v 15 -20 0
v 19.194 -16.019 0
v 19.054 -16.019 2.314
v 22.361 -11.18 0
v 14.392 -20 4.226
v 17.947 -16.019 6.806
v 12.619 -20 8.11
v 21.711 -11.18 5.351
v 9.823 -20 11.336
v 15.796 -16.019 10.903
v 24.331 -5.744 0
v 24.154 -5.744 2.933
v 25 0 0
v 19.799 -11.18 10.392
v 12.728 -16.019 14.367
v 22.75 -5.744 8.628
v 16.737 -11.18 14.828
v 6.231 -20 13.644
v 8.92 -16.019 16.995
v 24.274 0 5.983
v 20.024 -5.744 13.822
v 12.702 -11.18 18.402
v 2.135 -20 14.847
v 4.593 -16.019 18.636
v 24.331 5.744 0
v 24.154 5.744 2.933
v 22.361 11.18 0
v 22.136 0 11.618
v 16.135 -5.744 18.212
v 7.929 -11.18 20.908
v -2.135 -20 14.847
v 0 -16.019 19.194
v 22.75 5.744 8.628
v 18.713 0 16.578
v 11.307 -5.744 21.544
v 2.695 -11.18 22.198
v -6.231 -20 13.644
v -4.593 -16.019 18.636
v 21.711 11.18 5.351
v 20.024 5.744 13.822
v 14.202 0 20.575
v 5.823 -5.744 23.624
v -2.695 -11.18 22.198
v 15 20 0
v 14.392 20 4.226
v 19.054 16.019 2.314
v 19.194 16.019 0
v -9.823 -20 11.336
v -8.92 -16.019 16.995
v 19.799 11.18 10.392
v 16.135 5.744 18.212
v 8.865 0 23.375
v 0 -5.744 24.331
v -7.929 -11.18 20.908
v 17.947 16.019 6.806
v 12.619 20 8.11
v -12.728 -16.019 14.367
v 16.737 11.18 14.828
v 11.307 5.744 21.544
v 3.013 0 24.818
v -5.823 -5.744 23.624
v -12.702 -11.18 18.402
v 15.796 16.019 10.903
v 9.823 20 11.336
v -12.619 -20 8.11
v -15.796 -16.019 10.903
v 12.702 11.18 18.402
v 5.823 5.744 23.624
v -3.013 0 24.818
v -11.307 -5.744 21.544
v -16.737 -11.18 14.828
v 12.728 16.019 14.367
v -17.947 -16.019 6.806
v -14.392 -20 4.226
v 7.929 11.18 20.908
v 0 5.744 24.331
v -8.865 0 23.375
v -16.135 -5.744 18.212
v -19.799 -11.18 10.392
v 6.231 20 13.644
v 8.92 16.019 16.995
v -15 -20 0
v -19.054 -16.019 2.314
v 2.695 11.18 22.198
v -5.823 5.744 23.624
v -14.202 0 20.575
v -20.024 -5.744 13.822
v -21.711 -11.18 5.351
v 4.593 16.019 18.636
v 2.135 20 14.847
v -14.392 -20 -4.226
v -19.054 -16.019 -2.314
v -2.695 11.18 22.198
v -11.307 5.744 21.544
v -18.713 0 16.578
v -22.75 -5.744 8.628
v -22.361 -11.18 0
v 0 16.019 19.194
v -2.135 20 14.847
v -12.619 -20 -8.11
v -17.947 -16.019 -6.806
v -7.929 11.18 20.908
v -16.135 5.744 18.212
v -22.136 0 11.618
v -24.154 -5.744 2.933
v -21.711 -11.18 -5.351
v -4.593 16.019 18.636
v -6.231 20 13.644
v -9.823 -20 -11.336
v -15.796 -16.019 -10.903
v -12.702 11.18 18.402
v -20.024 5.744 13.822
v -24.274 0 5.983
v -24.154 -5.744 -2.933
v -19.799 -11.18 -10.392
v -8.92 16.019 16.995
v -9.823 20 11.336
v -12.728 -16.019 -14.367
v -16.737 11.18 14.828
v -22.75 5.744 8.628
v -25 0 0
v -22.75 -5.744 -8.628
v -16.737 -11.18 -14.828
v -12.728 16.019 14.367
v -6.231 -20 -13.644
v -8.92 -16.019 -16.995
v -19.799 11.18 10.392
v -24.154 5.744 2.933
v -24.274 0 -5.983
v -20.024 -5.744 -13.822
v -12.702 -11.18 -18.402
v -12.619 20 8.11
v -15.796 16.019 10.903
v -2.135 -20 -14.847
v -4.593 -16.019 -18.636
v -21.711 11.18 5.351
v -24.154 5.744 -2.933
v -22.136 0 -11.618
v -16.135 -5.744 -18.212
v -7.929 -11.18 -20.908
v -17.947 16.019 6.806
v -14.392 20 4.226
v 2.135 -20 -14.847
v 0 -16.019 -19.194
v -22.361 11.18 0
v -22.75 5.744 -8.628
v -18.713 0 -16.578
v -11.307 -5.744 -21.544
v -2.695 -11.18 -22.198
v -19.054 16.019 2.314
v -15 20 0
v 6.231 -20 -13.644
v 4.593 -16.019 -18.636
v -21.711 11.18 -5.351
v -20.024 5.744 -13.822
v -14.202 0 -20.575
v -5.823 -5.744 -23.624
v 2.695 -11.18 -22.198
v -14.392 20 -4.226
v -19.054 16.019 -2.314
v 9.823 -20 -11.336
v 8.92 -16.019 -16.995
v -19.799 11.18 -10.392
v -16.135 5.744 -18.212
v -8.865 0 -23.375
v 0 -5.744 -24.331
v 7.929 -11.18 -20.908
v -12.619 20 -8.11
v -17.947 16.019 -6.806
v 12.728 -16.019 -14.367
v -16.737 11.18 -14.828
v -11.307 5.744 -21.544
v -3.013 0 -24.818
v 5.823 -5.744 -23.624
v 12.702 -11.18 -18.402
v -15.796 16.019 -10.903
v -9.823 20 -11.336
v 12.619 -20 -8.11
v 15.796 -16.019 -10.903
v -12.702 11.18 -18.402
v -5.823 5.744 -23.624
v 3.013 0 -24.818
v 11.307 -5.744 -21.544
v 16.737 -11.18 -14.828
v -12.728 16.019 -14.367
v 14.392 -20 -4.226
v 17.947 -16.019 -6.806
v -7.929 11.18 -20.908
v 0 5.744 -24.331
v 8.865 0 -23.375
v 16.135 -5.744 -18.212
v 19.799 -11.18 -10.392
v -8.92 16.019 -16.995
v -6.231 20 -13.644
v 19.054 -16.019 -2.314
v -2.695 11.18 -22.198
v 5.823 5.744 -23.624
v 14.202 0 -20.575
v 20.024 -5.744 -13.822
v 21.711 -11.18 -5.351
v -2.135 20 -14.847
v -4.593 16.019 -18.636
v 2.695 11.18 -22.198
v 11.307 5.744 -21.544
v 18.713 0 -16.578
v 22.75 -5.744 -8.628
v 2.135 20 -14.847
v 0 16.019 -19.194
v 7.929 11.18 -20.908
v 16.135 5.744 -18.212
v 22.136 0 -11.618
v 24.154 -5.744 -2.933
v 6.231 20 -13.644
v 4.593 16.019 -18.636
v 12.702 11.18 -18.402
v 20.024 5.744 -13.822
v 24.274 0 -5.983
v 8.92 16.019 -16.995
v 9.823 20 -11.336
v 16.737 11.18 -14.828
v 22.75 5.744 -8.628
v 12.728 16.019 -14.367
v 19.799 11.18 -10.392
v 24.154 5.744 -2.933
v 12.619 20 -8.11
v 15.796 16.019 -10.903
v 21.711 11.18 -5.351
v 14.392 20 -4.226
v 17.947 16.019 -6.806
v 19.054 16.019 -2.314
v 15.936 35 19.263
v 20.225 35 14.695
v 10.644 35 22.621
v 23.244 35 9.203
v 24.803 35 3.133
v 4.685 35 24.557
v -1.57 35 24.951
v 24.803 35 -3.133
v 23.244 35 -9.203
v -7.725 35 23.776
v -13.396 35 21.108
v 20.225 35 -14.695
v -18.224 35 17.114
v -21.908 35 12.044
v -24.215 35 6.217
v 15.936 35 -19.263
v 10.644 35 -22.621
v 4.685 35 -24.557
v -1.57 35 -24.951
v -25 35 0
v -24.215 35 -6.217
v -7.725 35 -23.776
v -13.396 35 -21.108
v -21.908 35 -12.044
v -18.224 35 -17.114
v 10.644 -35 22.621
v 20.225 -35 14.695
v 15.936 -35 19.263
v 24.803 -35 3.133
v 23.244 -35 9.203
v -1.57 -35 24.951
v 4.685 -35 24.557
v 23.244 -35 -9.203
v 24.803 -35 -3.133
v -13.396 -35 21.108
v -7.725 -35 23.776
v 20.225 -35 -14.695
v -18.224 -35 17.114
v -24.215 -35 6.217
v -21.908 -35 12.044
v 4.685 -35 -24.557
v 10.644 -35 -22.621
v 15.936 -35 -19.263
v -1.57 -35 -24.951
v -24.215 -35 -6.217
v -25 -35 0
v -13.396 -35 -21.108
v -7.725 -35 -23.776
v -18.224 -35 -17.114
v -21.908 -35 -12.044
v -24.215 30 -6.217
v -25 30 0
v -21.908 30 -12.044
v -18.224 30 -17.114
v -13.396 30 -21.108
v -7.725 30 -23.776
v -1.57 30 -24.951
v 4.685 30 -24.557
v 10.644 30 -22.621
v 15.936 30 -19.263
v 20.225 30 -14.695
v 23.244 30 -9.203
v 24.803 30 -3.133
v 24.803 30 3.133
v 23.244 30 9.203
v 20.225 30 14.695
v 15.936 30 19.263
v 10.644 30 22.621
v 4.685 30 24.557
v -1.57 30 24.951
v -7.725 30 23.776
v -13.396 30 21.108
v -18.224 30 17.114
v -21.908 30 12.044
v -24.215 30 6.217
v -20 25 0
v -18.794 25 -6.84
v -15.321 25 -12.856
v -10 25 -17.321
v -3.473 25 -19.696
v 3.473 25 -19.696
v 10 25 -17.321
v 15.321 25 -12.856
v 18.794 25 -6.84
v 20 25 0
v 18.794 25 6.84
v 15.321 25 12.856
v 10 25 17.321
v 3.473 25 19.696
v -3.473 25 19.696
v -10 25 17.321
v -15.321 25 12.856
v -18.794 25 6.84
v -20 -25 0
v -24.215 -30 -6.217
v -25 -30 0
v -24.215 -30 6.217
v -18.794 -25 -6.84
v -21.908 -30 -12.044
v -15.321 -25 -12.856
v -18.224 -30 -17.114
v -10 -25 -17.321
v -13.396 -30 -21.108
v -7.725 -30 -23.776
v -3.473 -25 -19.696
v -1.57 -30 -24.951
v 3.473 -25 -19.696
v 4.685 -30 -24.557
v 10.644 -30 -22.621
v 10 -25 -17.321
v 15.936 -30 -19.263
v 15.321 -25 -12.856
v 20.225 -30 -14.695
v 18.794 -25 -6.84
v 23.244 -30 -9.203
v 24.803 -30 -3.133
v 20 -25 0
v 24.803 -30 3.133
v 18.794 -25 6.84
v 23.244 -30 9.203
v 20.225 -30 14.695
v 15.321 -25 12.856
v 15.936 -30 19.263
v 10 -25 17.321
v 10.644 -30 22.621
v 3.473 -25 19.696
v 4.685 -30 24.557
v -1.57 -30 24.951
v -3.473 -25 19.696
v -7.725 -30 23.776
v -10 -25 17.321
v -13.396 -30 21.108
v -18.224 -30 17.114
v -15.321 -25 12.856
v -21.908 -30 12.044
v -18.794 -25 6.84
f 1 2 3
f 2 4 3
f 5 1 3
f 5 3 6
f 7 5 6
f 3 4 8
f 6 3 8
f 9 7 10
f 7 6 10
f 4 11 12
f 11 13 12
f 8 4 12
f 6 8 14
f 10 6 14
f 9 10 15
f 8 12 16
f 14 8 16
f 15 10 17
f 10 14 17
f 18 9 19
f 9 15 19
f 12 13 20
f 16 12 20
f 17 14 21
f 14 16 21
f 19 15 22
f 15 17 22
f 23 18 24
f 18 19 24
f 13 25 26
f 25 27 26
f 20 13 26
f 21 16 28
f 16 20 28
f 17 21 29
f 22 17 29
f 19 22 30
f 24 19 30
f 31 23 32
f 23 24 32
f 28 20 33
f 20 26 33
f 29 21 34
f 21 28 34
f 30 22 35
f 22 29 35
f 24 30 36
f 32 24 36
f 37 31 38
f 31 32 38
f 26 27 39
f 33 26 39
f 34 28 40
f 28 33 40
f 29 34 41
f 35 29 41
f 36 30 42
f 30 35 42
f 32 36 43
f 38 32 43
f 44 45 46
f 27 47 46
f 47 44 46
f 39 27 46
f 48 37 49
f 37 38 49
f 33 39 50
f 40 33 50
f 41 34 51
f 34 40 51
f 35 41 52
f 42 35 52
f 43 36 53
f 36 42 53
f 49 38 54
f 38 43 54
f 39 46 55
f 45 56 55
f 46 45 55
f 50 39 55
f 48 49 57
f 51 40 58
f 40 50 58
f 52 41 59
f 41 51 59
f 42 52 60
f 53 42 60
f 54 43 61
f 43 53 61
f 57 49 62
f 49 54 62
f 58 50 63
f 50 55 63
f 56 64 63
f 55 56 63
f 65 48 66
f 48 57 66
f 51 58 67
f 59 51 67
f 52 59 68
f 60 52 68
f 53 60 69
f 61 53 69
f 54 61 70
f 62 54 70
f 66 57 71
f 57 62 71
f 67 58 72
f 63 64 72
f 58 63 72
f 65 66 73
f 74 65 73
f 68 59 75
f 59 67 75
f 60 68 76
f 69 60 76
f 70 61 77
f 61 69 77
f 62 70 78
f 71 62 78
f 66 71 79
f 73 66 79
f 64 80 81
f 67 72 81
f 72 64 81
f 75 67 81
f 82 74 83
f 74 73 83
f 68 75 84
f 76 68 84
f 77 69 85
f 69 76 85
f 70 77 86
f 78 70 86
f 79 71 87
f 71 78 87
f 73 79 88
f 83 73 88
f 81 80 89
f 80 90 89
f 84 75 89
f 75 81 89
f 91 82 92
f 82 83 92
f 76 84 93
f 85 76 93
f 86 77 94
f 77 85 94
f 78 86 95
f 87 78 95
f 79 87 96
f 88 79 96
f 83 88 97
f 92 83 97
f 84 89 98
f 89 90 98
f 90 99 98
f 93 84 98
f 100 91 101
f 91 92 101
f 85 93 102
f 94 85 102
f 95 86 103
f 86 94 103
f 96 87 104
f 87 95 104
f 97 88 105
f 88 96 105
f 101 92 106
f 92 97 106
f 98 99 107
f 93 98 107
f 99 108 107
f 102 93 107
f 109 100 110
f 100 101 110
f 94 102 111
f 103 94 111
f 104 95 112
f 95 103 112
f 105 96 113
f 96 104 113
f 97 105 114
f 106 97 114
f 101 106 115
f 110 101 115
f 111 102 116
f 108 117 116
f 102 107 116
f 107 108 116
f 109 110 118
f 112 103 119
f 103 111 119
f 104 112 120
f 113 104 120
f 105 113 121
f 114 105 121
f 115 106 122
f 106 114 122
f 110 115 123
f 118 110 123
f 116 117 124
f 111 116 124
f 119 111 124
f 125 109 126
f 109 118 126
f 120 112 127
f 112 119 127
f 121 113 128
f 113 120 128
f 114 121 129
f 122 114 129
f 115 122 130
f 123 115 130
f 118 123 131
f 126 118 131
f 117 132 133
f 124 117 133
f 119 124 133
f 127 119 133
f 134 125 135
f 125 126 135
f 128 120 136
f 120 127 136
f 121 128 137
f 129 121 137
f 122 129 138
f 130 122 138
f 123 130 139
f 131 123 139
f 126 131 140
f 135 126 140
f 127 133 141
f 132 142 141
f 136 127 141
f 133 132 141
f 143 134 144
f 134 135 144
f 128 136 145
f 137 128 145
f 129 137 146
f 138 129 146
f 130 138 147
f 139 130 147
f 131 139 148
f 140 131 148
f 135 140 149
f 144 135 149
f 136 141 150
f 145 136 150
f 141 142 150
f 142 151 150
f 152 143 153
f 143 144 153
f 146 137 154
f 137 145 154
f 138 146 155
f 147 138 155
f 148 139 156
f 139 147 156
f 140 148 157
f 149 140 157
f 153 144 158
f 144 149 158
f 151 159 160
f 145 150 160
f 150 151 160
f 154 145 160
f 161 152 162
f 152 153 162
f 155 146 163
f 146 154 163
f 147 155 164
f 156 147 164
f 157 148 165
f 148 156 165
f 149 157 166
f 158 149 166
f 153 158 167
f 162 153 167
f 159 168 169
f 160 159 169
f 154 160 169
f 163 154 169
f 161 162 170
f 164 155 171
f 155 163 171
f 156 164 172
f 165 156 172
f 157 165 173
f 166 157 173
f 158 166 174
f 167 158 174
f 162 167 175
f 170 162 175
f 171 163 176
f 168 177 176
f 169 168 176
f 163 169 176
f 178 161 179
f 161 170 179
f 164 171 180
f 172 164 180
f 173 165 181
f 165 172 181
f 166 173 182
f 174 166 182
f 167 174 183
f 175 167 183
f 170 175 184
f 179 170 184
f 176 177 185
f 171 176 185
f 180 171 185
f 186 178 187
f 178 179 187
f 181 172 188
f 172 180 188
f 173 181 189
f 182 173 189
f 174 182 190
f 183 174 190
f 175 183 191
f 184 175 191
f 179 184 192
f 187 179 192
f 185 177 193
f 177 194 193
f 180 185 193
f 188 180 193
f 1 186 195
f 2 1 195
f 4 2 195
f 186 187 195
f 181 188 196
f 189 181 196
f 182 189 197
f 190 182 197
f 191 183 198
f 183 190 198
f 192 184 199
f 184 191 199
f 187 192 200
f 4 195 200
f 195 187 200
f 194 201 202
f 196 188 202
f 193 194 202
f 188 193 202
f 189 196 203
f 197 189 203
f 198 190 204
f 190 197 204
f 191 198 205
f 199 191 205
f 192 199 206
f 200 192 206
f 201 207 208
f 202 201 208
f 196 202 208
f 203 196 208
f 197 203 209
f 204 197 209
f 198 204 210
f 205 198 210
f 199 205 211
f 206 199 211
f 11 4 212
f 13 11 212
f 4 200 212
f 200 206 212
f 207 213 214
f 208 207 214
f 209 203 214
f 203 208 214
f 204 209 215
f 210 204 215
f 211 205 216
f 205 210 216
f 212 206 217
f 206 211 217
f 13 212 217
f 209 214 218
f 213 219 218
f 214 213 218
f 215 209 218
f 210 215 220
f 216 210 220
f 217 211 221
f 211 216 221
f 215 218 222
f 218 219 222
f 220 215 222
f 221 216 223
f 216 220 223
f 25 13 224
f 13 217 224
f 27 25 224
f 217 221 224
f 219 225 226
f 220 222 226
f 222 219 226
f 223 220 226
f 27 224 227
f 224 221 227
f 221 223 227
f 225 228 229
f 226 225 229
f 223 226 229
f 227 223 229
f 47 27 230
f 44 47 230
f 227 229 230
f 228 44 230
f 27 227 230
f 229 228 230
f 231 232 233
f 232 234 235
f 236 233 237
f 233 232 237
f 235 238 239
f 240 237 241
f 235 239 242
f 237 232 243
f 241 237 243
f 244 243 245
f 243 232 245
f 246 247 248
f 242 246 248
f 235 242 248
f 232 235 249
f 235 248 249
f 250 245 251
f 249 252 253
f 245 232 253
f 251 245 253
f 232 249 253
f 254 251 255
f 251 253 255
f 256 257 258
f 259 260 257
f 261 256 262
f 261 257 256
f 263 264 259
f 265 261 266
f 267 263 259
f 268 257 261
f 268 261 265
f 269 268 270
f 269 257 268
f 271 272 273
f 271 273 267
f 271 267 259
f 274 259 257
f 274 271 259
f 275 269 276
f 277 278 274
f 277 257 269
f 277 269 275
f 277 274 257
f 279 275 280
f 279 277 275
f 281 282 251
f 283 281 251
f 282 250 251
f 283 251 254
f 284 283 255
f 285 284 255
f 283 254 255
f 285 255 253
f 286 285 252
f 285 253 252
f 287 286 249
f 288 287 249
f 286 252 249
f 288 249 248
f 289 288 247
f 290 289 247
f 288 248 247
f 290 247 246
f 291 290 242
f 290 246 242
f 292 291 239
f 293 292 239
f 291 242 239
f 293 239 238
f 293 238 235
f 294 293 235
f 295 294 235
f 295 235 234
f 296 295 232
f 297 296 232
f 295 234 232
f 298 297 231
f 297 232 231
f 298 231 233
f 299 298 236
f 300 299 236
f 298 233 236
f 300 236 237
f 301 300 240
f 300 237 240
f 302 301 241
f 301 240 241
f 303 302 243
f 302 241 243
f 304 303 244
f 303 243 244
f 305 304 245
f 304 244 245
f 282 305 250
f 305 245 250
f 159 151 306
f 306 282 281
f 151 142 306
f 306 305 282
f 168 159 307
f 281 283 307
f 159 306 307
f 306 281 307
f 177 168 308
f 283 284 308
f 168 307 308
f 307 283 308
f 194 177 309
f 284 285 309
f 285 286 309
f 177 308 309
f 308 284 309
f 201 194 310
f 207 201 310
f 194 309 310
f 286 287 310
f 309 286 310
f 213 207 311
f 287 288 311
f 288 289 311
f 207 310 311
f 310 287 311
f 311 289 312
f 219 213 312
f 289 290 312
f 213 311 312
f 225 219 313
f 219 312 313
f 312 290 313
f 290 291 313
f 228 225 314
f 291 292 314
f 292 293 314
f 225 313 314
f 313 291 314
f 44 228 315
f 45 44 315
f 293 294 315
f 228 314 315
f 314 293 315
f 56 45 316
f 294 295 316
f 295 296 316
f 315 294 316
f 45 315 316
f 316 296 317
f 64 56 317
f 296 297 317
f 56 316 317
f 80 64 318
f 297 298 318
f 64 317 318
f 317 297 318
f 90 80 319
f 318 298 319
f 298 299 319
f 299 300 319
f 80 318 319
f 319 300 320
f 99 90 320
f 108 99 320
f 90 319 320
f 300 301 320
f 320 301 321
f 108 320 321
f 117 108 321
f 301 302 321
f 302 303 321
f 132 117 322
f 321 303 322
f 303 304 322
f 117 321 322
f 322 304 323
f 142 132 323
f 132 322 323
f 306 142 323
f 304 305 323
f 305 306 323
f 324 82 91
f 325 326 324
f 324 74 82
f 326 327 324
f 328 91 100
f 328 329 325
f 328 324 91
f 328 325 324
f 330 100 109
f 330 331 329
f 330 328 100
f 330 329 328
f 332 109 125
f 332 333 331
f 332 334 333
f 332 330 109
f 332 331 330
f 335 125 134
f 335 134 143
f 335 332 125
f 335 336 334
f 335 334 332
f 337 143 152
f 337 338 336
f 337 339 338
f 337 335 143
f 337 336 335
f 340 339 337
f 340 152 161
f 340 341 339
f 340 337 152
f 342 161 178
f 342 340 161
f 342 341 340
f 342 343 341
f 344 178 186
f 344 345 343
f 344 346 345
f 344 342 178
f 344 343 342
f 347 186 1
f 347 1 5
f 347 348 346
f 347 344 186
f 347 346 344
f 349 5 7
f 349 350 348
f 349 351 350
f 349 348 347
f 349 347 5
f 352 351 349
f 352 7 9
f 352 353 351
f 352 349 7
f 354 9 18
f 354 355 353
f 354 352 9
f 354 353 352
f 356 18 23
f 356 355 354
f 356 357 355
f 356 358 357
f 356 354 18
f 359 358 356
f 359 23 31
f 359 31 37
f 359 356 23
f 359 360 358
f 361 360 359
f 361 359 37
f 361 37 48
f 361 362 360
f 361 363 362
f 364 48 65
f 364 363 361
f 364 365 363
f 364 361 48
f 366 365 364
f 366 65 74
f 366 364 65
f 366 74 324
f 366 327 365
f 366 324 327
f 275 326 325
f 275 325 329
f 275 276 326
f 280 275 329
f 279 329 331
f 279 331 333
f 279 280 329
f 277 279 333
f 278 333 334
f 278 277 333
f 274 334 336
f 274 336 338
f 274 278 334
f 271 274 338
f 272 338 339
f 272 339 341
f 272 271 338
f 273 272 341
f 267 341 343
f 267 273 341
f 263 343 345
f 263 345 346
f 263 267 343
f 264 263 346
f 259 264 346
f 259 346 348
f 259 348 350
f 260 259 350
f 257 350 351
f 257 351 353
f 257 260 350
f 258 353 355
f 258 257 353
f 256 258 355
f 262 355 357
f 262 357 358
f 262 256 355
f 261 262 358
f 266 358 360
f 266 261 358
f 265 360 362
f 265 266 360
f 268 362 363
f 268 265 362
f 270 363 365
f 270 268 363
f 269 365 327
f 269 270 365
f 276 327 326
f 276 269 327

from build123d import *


with BuildPart() as part:
    # 草图1 → 旋转2 (revolve)
    with BuildSketch(Plane.XY):
        with BuildLine():
            Line((0, 20), (0, -20))
            Line((0, -20), (15, -20))
            ThreePointArc((15, -20), (25, 0), (15, 20))
            Line((15, 20), (0, 20))
        make_face()
    revolve(axis=Axis((0, 20, 0), (0, -1, 0)))

    # 草图2 → 旋转3 (revolve)
    with BuildSketch(Plane.XY, mode=Mode.PRIVATE) as revolve_3_sk:
        Polygon((0, 20), (15, 20), (25, 30), (25, 35), (0, 35), align=None)
    revolve_3 = revolve(revolve_3_sk.sketch.rotate(Axis((0, 35, 0), (0, -1, 0)), 180), axis=Axis((0, 35, 0), (0, -1, 0)))

    # 镜向1: 旋转3 across plane
    add(revolve_3.mirror(Plane.ZX))


solid = part.part
